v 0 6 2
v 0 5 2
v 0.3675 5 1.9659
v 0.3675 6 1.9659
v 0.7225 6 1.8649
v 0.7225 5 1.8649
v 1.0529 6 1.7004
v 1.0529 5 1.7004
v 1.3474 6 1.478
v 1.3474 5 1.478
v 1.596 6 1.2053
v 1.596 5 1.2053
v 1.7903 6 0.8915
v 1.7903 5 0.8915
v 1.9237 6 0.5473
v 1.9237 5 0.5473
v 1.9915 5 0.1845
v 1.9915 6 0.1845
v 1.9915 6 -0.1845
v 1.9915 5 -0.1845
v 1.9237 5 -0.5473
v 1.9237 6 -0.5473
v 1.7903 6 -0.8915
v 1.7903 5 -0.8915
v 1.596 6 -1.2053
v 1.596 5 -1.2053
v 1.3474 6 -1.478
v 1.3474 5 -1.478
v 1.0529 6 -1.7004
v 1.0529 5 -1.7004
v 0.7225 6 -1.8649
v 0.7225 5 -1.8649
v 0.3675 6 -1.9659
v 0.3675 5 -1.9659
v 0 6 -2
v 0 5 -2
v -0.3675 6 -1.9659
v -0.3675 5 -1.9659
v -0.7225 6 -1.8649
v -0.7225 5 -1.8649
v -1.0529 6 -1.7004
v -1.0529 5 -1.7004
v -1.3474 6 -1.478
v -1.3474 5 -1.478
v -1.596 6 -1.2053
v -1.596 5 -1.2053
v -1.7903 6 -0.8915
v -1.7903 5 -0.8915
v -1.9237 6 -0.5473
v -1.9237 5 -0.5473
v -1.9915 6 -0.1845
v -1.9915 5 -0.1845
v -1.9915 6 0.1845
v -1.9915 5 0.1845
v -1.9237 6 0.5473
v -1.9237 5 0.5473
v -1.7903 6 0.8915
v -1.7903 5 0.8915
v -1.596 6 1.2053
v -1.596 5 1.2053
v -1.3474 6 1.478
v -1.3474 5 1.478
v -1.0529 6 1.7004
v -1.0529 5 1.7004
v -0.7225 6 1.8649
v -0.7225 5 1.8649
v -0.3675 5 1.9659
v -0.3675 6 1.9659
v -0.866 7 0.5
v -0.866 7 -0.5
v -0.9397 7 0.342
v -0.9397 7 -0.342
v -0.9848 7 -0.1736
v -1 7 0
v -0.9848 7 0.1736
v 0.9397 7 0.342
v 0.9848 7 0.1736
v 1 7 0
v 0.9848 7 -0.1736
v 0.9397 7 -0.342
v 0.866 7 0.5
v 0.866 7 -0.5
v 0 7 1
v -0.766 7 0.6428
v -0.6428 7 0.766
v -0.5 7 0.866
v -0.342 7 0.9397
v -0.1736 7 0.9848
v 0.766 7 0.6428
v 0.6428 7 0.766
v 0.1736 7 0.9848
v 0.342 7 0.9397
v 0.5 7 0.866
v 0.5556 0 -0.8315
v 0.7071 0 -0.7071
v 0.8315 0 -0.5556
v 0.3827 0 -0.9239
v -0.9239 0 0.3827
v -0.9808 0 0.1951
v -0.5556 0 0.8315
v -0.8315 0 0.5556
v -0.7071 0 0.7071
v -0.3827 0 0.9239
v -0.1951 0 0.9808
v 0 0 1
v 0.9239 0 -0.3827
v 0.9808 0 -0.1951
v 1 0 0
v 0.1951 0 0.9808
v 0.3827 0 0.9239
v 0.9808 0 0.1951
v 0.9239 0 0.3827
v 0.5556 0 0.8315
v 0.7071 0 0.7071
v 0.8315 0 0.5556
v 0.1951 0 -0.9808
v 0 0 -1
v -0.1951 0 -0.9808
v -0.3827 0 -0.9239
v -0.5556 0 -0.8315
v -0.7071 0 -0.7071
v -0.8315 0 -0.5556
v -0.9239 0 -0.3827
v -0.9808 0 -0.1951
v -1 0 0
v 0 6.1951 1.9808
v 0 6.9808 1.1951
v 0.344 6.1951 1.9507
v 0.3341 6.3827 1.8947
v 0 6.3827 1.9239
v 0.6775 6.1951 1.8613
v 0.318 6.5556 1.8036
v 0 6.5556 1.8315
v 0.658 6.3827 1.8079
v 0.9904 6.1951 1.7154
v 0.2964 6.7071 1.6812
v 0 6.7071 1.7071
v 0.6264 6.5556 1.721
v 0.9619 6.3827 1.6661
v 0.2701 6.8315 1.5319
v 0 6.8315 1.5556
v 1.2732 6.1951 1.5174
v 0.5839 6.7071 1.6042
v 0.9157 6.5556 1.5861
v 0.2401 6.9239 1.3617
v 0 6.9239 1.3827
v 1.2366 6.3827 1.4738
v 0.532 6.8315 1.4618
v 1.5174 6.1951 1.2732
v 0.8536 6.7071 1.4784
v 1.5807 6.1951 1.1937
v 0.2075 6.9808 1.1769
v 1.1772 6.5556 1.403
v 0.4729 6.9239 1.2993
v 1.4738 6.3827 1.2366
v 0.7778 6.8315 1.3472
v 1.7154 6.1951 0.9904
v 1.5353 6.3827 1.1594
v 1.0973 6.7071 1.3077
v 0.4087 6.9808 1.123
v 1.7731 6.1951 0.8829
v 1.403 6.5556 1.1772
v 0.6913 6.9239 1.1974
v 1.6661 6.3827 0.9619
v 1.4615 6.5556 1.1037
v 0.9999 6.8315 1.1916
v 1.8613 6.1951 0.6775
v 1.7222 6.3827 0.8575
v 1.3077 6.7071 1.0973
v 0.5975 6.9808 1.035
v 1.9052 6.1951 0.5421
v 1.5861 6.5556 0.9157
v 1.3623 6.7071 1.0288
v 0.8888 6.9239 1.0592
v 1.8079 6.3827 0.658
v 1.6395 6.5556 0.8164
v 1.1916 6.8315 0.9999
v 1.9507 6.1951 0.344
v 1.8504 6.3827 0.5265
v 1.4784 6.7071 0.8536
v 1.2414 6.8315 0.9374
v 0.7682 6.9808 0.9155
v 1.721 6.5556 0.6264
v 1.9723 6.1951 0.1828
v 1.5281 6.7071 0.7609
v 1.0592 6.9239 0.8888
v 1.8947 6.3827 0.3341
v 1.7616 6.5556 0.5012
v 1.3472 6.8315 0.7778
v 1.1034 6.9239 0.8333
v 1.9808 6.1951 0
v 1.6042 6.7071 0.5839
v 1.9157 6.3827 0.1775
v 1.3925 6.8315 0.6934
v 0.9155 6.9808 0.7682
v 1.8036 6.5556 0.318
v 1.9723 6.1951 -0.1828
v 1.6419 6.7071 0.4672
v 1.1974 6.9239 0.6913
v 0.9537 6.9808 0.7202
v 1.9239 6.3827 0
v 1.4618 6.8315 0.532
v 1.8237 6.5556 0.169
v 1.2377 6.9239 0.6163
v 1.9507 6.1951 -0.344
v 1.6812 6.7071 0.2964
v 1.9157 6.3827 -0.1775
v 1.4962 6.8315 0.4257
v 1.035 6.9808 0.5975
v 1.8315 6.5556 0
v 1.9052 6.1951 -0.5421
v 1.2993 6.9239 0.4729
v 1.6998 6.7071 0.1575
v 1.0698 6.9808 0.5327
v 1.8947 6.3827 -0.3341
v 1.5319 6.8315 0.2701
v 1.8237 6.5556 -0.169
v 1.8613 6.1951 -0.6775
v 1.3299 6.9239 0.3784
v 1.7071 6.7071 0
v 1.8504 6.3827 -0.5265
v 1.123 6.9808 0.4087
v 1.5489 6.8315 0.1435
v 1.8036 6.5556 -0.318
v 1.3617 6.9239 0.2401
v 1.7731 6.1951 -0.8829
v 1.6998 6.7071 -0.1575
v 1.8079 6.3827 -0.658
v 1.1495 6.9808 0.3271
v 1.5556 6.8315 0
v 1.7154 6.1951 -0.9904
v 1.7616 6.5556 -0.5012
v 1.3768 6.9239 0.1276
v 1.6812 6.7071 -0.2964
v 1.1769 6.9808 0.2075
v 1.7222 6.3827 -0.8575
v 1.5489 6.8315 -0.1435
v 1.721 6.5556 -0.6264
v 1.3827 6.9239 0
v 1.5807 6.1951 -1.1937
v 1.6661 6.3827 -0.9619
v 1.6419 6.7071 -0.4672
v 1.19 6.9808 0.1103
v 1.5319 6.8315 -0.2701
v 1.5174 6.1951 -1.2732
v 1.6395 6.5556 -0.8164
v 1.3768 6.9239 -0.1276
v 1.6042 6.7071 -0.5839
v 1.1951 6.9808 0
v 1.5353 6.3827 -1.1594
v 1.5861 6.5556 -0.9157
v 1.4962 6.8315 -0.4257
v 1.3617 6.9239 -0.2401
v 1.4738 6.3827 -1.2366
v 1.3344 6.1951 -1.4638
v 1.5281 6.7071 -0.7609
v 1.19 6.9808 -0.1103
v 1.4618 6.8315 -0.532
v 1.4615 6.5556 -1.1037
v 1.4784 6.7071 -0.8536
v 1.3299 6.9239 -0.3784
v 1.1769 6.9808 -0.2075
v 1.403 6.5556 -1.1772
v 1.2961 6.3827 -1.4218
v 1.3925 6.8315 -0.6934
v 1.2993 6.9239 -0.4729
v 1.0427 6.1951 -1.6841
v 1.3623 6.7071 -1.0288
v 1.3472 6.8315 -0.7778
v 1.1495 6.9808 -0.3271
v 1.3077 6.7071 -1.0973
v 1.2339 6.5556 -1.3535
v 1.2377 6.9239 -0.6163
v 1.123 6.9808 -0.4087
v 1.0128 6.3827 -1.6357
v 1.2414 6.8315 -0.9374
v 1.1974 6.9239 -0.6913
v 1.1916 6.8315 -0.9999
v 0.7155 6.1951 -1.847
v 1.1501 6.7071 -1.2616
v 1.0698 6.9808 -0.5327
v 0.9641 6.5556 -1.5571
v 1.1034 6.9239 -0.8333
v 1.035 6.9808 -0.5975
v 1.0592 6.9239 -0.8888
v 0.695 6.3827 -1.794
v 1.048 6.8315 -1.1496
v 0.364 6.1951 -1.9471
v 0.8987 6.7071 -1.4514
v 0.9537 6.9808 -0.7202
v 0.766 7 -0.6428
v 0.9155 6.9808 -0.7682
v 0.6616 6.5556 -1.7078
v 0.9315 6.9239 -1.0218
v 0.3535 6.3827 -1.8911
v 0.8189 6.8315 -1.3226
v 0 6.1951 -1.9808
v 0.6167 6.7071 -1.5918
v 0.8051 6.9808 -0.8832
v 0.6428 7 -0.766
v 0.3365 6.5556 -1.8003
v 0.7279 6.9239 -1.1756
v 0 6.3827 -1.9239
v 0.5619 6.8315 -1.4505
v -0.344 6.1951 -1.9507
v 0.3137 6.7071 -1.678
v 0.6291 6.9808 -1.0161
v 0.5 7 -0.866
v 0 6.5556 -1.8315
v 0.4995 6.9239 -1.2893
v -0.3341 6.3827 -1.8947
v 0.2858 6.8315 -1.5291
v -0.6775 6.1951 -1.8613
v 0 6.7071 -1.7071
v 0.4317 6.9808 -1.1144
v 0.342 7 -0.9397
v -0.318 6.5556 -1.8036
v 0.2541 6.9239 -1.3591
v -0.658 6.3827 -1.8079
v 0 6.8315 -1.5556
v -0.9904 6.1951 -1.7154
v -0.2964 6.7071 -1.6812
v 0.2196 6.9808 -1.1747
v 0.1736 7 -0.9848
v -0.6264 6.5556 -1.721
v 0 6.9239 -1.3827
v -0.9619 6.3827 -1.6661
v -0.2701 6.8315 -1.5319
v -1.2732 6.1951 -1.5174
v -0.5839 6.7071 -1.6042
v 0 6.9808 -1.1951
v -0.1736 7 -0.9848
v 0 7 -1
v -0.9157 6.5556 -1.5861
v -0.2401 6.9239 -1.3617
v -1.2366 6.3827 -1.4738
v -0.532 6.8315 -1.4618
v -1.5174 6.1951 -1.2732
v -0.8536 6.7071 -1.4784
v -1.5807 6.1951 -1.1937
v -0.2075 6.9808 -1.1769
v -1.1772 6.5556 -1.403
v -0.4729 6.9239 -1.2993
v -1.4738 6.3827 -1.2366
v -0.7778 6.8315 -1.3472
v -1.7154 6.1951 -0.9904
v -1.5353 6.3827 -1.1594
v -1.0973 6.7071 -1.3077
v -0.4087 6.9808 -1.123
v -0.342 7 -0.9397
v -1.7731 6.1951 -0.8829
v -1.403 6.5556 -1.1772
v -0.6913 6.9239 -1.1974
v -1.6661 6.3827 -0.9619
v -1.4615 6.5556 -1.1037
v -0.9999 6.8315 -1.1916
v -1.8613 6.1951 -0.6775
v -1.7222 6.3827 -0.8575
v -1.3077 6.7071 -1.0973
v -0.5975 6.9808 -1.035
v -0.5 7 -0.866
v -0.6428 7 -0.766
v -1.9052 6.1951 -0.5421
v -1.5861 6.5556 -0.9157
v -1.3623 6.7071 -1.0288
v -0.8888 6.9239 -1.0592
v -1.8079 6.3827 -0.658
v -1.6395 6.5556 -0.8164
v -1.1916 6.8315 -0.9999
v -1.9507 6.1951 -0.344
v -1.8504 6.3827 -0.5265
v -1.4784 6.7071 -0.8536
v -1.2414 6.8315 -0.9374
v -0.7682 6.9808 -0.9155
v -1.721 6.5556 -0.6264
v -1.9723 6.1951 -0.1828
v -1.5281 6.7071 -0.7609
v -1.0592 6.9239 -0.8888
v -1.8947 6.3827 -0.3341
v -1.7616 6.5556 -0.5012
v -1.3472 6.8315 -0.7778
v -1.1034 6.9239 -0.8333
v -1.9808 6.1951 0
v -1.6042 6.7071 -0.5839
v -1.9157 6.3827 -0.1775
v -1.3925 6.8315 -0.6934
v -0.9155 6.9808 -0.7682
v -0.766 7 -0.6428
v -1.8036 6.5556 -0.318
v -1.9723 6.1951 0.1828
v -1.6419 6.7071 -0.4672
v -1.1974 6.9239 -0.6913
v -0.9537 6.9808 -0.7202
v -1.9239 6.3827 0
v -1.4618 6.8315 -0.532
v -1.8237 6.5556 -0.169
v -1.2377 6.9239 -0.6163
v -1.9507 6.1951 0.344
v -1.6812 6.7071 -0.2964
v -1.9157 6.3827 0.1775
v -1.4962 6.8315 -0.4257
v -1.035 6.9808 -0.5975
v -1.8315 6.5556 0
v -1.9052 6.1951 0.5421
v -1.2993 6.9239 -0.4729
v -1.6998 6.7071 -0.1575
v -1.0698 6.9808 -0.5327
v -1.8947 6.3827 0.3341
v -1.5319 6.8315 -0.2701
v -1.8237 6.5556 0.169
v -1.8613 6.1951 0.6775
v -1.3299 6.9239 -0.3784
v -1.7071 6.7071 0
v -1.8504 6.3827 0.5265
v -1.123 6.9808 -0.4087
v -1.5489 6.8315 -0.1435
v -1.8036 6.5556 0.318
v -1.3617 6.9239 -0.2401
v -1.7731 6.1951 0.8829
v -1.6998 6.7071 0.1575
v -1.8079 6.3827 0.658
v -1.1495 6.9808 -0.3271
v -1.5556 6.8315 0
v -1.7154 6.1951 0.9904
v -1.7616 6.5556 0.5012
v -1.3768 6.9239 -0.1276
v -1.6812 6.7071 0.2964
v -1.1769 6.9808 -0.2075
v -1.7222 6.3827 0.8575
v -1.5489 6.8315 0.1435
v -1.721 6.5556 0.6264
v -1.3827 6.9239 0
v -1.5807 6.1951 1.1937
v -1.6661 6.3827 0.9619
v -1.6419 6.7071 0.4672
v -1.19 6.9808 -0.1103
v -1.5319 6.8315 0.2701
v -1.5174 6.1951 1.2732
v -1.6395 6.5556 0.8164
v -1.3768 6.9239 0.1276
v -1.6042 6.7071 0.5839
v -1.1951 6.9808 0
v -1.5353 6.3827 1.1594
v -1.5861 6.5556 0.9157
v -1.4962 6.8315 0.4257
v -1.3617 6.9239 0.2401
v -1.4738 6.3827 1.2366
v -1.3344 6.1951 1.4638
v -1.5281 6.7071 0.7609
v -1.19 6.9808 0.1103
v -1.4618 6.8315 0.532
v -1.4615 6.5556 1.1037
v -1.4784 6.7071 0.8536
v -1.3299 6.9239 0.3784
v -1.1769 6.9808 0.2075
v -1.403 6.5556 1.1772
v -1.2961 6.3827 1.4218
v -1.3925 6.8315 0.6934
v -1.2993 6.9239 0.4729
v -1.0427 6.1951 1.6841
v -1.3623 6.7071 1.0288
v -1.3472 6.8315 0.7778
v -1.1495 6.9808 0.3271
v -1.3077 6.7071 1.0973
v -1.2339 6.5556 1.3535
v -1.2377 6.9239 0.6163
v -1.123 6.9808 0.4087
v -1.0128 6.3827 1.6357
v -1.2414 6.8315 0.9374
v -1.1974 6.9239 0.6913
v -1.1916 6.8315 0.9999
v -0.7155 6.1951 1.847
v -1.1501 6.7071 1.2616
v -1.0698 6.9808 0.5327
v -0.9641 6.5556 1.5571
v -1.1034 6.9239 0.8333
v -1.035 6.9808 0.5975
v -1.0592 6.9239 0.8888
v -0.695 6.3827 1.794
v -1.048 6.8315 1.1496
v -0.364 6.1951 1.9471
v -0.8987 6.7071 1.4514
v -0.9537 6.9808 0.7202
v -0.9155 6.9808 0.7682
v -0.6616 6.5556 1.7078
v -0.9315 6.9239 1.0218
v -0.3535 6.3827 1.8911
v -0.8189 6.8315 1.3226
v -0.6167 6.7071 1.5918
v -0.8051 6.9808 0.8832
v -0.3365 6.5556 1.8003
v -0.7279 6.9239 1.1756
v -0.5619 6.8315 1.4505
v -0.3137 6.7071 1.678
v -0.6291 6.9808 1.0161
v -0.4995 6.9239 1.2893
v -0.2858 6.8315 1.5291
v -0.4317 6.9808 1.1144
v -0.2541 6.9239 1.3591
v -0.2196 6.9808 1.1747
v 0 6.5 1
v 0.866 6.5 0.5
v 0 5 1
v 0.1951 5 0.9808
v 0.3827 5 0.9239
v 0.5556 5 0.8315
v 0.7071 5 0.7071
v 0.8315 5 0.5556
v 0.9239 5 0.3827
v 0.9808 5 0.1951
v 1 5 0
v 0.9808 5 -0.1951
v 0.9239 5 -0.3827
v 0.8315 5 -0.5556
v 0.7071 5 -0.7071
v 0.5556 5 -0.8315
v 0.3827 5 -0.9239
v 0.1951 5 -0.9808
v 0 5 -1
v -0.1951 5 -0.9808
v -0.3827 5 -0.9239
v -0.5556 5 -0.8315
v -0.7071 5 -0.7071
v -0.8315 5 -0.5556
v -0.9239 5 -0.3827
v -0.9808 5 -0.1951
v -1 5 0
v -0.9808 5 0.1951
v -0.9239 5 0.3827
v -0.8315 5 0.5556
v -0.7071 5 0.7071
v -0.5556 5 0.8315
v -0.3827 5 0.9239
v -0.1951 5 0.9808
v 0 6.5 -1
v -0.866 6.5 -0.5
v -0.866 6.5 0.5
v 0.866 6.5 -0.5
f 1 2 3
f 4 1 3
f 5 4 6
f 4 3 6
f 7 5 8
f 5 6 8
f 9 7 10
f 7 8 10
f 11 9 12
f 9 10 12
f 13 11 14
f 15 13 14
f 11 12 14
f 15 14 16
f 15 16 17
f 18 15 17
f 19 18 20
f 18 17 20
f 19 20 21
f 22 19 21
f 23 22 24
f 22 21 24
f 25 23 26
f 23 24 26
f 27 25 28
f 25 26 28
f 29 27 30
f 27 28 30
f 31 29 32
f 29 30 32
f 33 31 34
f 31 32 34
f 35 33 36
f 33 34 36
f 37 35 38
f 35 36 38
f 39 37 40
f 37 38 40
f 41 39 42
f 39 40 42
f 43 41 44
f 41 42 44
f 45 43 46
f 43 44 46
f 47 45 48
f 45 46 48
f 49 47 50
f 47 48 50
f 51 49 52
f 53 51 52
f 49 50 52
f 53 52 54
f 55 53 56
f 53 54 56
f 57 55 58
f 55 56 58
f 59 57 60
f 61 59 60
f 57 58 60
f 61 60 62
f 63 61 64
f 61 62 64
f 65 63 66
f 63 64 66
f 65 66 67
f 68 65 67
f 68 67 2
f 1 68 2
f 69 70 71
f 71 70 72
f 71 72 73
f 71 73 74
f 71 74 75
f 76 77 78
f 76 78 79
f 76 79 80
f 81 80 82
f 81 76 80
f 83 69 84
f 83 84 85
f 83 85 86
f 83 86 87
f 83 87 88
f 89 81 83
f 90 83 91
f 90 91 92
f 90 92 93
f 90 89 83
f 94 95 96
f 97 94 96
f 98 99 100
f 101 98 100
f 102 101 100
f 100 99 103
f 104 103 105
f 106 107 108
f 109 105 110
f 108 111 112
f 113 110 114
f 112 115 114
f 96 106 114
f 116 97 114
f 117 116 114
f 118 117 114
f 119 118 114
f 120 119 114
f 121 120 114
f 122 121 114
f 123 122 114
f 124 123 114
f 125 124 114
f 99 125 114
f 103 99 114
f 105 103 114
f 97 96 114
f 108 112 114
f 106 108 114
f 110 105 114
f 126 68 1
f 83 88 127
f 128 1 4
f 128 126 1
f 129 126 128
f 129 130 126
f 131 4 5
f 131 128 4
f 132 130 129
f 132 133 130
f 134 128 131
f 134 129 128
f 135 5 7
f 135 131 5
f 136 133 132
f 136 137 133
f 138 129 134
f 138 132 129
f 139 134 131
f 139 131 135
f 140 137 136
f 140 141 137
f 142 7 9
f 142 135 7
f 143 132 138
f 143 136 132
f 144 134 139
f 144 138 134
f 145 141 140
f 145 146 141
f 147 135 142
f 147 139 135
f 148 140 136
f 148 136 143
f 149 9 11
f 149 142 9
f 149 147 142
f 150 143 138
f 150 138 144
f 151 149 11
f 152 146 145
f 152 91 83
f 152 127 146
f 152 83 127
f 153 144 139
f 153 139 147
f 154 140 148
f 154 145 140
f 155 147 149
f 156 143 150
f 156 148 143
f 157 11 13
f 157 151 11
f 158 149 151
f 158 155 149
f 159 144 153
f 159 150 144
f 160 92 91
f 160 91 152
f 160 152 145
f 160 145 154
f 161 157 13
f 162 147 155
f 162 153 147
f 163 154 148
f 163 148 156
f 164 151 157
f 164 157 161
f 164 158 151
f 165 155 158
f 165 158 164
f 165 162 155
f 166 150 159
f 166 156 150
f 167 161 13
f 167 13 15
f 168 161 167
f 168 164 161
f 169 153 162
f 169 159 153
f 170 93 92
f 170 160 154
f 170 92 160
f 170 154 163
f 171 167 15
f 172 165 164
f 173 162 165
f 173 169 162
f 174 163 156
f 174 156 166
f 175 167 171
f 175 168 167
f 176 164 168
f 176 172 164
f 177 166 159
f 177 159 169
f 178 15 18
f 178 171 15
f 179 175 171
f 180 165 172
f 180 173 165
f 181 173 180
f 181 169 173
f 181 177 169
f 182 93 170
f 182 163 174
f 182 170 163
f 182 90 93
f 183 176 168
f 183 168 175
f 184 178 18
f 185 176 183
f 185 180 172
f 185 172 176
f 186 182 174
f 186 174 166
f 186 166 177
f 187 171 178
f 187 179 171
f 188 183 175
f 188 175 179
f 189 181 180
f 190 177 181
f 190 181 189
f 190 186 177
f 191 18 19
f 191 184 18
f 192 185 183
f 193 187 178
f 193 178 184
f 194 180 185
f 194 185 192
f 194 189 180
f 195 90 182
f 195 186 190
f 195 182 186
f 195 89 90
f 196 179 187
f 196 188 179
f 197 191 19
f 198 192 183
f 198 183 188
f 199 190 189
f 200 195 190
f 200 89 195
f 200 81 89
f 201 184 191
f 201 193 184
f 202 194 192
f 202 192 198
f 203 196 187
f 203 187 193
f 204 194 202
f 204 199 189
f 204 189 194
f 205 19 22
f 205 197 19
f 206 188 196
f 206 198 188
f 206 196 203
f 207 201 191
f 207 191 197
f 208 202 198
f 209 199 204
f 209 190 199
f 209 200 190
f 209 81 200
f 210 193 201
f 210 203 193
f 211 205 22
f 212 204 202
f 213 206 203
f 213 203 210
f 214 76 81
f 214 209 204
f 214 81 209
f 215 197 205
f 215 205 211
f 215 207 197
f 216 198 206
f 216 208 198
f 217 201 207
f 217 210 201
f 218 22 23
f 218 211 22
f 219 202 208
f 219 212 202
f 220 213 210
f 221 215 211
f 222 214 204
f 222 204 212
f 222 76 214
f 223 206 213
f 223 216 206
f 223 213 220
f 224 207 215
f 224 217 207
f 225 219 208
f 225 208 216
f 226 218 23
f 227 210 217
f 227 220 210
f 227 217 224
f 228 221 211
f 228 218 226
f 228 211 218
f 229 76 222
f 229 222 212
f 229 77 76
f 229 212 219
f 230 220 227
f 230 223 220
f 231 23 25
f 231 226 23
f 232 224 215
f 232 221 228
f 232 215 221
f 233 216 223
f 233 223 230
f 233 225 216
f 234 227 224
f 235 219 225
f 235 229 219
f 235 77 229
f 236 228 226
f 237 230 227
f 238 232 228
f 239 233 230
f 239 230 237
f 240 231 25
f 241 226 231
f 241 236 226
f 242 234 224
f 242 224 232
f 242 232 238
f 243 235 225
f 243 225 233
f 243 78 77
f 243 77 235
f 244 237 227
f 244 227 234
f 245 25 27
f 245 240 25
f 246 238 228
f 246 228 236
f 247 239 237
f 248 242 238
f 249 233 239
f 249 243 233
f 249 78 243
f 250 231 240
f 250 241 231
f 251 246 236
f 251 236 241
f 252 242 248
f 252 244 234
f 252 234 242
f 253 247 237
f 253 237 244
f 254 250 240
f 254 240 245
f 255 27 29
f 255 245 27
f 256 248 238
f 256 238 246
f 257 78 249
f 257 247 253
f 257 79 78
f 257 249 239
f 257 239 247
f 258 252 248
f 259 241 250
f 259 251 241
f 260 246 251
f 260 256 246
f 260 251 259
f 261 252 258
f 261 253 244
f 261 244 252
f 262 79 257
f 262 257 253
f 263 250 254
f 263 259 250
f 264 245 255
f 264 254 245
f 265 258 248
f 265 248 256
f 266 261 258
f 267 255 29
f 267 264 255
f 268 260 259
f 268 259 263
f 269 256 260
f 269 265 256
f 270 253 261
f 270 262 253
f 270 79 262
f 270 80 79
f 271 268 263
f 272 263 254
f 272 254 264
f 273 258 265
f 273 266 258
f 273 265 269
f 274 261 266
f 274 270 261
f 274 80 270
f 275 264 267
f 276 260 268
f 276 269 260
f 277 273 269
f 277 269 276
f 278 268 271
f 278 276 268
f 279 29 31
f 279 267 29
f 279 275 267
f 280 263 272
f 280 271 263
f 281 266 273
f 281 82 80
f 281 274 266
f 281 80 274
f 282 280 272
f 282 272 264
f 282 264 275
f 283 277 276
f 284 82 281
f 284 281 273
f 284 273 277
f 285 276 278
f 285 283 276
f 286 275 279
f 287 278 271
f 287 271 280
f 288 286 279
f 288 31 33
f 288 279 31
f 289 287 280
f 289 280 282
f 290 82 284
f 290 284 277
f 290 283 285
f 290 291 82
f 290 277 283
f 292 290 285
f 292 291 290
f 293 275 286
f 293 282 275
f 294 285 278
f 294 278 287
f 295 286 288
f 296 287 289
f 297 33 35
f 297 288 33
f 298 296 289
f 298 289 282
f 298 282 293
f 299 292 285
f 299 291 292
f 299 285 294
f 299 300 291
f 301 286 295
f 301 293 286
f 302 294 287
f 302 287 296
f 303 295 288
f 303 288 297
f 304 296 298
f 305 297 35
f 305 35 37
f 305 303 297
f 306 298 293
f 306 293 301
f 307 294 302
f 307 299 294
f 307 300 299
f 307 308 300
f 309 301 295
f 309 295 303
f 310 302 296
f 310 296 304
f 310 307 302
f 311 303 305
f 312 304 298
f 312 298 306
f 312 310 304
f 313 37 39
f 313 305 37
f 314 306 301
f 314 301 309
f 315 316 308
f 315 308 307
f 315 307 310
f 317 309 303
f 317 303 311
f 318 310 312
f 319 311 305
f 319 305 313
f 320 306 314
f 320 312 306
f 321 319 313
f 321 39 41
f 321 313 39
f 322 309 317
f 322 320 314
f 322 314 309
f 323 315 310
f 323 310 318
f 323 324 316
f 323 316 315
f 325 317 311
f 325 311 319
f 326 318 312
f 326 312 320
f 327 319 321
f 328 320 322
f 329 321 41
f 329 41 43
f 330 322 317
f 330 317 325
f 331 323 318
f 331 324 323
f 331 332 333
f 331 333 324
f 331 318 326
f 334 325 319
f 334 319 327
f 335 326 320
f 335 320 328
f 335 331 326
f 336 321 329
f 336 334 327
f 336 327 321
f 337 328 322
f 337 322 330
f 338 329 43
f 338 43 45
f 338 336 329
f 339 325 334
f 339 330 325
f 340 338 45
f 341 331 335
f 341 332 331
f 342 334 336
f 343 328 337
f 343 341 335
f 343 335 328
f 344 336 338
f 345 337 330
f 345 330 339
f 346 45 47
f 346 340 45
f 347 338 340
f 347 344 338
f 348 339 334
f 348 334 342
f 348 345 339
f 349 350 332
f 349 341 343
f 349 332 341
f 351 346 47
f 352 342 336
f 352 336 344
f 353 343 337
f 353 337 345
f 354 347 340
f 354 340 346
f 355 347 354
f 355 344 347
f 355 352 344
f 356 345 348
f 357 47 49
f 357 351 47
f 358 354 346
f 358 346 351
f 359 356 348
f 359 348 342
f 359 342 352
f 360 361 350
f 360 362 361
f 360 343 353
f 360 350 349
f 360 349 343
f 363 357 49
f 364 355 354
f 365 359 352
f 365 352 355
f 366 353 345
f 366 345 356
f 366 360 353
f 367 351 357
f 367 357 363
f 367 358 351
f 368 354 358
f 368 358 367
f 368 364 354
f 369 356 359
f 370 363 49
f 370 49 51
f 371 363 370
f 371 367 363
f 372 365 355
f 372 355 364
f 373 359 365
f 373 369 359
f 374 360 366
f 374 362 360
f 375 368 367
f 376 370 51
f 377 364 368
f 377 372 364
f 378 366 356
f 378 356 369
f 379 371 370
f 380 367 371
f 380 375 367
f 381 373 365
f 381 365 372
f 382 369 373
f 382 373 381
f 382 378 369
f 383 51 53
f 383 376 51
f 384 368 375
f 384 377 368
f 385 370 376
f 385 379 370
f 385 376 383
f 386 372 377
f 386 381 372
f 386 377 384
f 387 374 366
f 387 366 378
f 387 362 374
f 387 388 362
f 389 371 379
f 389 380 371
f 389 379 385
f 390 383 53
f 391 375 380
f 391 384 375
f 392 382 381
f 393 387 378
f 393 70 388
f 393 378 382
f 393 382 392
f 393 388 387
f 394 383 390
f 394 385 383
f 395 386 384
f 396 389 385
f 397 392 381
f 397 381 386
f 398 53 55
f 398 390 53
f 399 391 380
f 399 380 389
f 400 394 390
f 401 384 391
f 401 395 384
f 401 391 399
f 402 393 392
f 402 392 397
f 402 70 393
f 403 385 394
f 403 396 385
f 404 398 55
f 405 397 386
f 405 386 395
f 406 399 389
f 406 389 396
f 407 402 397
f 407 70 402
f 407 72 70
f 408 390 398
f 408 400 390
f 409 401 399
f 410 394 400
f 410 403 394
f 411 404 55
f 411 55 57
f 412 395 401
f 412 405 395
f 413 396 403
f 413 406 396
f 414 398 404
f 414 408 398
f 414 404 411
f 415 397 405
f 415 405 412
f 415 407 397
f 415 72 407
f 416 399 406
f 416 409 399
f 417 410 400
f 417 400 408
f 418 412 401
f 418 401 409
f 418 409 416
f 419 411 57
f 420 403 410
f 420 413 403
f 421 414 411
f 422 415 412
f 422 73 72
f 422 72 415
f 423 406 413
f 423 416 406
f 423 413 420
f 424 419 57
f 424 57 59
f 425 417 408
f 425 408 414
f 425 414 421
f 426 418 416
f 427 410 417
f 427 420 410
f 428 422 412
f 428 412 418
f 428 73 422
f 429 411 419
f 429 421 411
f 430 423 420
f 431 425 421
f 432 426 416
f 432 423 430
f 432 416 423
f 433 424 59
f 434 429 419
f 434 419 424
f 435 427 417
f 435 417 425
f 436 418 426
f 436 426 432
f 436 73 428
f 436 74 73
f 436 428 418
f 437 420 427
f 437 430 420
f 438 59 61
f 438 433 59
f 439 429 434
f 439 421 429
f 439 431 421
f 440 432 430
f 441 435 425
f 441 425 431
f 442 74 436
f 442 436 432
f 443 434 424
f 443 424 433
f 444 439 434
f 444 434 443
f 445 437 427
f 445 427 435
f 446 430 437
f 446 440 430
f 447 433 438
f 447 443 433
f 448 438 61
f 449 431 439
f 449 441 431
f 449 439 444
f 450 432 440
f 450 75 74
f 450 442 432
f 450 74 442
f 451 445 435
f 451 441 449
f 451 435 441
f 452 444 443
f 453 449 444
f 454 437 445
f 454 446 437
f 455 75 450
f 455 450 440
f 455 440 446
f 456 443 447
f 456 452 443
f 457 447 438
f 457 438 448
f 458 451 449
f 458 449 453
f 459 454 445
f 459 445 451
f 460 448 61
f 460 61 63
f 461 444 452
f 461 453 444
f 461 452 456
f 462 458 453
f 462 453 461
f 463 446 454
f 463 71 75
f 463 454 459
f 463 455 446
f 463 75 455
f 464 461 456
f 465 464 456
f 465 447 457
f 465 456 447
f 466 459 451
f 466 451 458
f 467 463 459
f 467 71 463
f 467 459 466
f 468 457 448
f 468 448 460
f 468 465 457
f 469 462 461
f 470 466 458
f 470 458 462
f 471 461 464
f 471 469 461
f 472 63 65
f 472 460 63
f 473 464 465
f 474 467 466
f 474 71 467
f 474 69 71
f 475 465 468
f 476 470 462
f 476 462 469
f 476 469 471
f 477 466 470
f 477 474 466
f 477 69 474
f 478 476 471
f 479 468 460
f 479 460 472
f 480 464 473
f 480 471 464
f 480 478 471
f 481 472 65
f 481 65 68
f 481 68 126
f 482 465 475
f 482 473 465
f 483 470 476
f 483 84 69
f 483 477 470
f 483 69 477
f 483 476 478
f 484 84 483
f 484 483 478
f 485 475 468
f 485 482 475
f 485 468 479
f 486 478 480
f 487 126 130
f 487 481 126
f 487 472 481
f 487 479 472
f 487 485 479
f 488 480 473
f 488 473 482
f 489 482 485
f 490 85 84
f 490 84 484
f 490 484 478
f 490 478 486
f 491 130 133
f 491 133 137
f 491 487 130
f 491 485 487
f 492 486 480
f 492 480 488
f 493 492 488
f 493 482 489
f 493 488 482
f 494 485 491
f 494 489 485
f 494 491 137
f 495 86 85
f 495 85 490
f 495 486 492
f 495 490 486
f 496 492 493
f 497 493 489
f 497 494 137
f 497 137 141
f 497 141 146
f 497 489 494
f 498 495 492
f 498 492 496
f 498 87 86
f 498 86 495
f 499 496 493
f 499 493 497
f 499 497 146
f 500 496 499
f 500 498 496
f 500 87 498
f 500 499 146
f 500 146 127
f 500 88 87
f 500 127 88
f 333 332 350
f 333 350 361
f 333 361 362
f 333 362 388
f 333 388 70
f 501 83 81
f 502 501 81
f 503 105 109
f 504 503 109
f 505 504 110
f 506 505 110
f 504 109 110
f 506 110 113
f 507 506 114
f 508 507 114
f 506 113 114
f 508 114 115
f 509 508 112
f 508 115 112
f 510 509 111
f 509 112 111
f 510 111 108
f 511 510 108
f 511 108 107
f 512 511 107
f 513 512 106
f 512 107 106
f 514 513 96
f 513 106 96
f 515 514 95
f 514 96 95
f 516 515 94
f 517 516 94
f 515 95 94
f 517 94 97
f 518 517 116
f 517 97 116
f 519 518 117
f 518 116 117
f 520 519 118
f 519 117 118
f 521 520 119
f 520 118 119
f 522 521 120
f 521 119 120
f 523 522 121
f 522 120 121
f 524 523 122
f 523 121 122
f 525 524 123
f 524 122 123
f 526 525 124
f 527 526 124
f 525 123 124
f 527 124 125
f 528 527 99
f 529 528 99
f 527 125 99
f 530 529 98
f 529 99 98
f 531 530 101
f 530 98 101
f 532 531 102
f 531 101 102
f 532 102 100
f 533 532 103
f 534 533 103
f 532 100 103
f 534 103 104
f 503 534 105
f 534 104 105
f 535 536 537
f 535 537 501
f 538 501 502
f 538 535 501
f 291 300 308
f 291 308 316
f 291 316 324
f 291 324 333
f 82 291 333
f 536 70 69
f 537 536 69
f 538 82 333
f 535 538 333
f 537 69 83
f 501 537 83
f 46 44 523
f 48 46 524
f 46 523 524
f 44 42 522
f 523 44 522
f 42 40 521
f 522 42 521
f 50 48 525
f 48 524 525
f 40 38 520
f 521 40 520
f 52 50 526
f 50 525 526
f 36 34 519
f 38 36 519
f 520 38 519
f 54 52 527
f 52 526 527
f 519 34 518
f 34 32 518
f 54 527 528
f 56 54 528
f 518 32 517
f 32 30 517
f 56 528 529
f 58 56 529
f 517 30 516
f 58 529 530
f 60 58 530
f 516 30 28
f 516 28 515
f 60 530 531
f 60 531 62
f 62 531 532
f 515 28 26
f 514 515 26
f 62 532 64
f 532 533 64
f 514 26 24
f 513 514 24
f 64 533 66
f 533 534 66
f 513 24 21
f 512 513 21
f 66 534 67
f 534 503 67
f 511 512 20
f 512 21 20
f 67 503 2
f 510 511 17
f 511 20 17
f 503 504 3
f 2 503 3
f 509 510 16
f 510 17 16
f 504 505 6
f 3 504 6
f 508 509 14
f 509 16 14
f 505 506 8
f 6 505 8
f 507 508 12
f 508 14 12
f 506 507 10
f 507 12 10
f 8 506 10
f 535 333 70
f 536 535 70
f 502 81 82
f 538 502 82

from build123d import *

# Parameters (mm, degrees)
SKETCH1_R           = 1
BOSS_EXTRUDE1_DEPTH = 5
SKETCH2_R           = 2
BOSS_EXTRUDE2_DEPTH = 2
FILLET1_R           = 1
CUT_EXTRUDE1_DEPTH  = 0.5


with BuildPart() as part:
    # Sketch1 → Boss-Extrude1 (new body)
    with BuildSketch(Plane(origin=(0, 0, 0), x_dir=(1, 0, 0), z_dir=(0, 1, 0))):
        with Locations(Location((0, 0, 0), (0, 0, 270))):
            Circle(SKETCH1_R)
    extrude(amount=BOSS_EXTRUDE1_DEPTH)

    # Sketch2 → Boss-Extrude2 (add)
    with BuildSketch(Plane(origin=(0, 5, 0), x_dir=(1, 0, 0), z_dir=(0, 1, 0))):
        with Locations(Location((0, 0, 0), (0, 0, 270))):
            Circle(SKETCH2_R)
    extrude(amount=BOSS_EXTRUDE2_DEPTH)

    # Fillet1
    fillet1_edges = [part.edges().sort_by_distance(p)[0] for p in [
        (0, 7, -2),
    ]]
    fillet(fillet1_edges, radius=FILLET1_R)

    # Sketch3 → Cut-Extrude1 (cut)
    with BuildSketch(Plane(origin=(0, 7, 0), x_dir=(1, 0, 0), z_dir=(0, 1, 0))):
        Polygon((-0.866025404, 0.5), (0, 0), (0, 1), align=None)
        Polygon((-0.866025404, -0.5), (0, 0), (-0.866025404, 0.5), align=None)
        Polygon((-0.866025404, -0.5), (0, -1), (0, 0), align=None)
        Polygon((0, 0), (0, -1), (0.866025404, -0.5), align=None)
        Polygon((0.866025404, 0.5), (0, 0), (0.866025404, -0.5), align=None)
        Polygon((0, 1), (0, 0), (0.866025404, 0.5), align=None)
    extrude(amount=-CUT_EXTRUDE1_DEPTH, mode=Mode.SUBTRACT)


solid = part.part
